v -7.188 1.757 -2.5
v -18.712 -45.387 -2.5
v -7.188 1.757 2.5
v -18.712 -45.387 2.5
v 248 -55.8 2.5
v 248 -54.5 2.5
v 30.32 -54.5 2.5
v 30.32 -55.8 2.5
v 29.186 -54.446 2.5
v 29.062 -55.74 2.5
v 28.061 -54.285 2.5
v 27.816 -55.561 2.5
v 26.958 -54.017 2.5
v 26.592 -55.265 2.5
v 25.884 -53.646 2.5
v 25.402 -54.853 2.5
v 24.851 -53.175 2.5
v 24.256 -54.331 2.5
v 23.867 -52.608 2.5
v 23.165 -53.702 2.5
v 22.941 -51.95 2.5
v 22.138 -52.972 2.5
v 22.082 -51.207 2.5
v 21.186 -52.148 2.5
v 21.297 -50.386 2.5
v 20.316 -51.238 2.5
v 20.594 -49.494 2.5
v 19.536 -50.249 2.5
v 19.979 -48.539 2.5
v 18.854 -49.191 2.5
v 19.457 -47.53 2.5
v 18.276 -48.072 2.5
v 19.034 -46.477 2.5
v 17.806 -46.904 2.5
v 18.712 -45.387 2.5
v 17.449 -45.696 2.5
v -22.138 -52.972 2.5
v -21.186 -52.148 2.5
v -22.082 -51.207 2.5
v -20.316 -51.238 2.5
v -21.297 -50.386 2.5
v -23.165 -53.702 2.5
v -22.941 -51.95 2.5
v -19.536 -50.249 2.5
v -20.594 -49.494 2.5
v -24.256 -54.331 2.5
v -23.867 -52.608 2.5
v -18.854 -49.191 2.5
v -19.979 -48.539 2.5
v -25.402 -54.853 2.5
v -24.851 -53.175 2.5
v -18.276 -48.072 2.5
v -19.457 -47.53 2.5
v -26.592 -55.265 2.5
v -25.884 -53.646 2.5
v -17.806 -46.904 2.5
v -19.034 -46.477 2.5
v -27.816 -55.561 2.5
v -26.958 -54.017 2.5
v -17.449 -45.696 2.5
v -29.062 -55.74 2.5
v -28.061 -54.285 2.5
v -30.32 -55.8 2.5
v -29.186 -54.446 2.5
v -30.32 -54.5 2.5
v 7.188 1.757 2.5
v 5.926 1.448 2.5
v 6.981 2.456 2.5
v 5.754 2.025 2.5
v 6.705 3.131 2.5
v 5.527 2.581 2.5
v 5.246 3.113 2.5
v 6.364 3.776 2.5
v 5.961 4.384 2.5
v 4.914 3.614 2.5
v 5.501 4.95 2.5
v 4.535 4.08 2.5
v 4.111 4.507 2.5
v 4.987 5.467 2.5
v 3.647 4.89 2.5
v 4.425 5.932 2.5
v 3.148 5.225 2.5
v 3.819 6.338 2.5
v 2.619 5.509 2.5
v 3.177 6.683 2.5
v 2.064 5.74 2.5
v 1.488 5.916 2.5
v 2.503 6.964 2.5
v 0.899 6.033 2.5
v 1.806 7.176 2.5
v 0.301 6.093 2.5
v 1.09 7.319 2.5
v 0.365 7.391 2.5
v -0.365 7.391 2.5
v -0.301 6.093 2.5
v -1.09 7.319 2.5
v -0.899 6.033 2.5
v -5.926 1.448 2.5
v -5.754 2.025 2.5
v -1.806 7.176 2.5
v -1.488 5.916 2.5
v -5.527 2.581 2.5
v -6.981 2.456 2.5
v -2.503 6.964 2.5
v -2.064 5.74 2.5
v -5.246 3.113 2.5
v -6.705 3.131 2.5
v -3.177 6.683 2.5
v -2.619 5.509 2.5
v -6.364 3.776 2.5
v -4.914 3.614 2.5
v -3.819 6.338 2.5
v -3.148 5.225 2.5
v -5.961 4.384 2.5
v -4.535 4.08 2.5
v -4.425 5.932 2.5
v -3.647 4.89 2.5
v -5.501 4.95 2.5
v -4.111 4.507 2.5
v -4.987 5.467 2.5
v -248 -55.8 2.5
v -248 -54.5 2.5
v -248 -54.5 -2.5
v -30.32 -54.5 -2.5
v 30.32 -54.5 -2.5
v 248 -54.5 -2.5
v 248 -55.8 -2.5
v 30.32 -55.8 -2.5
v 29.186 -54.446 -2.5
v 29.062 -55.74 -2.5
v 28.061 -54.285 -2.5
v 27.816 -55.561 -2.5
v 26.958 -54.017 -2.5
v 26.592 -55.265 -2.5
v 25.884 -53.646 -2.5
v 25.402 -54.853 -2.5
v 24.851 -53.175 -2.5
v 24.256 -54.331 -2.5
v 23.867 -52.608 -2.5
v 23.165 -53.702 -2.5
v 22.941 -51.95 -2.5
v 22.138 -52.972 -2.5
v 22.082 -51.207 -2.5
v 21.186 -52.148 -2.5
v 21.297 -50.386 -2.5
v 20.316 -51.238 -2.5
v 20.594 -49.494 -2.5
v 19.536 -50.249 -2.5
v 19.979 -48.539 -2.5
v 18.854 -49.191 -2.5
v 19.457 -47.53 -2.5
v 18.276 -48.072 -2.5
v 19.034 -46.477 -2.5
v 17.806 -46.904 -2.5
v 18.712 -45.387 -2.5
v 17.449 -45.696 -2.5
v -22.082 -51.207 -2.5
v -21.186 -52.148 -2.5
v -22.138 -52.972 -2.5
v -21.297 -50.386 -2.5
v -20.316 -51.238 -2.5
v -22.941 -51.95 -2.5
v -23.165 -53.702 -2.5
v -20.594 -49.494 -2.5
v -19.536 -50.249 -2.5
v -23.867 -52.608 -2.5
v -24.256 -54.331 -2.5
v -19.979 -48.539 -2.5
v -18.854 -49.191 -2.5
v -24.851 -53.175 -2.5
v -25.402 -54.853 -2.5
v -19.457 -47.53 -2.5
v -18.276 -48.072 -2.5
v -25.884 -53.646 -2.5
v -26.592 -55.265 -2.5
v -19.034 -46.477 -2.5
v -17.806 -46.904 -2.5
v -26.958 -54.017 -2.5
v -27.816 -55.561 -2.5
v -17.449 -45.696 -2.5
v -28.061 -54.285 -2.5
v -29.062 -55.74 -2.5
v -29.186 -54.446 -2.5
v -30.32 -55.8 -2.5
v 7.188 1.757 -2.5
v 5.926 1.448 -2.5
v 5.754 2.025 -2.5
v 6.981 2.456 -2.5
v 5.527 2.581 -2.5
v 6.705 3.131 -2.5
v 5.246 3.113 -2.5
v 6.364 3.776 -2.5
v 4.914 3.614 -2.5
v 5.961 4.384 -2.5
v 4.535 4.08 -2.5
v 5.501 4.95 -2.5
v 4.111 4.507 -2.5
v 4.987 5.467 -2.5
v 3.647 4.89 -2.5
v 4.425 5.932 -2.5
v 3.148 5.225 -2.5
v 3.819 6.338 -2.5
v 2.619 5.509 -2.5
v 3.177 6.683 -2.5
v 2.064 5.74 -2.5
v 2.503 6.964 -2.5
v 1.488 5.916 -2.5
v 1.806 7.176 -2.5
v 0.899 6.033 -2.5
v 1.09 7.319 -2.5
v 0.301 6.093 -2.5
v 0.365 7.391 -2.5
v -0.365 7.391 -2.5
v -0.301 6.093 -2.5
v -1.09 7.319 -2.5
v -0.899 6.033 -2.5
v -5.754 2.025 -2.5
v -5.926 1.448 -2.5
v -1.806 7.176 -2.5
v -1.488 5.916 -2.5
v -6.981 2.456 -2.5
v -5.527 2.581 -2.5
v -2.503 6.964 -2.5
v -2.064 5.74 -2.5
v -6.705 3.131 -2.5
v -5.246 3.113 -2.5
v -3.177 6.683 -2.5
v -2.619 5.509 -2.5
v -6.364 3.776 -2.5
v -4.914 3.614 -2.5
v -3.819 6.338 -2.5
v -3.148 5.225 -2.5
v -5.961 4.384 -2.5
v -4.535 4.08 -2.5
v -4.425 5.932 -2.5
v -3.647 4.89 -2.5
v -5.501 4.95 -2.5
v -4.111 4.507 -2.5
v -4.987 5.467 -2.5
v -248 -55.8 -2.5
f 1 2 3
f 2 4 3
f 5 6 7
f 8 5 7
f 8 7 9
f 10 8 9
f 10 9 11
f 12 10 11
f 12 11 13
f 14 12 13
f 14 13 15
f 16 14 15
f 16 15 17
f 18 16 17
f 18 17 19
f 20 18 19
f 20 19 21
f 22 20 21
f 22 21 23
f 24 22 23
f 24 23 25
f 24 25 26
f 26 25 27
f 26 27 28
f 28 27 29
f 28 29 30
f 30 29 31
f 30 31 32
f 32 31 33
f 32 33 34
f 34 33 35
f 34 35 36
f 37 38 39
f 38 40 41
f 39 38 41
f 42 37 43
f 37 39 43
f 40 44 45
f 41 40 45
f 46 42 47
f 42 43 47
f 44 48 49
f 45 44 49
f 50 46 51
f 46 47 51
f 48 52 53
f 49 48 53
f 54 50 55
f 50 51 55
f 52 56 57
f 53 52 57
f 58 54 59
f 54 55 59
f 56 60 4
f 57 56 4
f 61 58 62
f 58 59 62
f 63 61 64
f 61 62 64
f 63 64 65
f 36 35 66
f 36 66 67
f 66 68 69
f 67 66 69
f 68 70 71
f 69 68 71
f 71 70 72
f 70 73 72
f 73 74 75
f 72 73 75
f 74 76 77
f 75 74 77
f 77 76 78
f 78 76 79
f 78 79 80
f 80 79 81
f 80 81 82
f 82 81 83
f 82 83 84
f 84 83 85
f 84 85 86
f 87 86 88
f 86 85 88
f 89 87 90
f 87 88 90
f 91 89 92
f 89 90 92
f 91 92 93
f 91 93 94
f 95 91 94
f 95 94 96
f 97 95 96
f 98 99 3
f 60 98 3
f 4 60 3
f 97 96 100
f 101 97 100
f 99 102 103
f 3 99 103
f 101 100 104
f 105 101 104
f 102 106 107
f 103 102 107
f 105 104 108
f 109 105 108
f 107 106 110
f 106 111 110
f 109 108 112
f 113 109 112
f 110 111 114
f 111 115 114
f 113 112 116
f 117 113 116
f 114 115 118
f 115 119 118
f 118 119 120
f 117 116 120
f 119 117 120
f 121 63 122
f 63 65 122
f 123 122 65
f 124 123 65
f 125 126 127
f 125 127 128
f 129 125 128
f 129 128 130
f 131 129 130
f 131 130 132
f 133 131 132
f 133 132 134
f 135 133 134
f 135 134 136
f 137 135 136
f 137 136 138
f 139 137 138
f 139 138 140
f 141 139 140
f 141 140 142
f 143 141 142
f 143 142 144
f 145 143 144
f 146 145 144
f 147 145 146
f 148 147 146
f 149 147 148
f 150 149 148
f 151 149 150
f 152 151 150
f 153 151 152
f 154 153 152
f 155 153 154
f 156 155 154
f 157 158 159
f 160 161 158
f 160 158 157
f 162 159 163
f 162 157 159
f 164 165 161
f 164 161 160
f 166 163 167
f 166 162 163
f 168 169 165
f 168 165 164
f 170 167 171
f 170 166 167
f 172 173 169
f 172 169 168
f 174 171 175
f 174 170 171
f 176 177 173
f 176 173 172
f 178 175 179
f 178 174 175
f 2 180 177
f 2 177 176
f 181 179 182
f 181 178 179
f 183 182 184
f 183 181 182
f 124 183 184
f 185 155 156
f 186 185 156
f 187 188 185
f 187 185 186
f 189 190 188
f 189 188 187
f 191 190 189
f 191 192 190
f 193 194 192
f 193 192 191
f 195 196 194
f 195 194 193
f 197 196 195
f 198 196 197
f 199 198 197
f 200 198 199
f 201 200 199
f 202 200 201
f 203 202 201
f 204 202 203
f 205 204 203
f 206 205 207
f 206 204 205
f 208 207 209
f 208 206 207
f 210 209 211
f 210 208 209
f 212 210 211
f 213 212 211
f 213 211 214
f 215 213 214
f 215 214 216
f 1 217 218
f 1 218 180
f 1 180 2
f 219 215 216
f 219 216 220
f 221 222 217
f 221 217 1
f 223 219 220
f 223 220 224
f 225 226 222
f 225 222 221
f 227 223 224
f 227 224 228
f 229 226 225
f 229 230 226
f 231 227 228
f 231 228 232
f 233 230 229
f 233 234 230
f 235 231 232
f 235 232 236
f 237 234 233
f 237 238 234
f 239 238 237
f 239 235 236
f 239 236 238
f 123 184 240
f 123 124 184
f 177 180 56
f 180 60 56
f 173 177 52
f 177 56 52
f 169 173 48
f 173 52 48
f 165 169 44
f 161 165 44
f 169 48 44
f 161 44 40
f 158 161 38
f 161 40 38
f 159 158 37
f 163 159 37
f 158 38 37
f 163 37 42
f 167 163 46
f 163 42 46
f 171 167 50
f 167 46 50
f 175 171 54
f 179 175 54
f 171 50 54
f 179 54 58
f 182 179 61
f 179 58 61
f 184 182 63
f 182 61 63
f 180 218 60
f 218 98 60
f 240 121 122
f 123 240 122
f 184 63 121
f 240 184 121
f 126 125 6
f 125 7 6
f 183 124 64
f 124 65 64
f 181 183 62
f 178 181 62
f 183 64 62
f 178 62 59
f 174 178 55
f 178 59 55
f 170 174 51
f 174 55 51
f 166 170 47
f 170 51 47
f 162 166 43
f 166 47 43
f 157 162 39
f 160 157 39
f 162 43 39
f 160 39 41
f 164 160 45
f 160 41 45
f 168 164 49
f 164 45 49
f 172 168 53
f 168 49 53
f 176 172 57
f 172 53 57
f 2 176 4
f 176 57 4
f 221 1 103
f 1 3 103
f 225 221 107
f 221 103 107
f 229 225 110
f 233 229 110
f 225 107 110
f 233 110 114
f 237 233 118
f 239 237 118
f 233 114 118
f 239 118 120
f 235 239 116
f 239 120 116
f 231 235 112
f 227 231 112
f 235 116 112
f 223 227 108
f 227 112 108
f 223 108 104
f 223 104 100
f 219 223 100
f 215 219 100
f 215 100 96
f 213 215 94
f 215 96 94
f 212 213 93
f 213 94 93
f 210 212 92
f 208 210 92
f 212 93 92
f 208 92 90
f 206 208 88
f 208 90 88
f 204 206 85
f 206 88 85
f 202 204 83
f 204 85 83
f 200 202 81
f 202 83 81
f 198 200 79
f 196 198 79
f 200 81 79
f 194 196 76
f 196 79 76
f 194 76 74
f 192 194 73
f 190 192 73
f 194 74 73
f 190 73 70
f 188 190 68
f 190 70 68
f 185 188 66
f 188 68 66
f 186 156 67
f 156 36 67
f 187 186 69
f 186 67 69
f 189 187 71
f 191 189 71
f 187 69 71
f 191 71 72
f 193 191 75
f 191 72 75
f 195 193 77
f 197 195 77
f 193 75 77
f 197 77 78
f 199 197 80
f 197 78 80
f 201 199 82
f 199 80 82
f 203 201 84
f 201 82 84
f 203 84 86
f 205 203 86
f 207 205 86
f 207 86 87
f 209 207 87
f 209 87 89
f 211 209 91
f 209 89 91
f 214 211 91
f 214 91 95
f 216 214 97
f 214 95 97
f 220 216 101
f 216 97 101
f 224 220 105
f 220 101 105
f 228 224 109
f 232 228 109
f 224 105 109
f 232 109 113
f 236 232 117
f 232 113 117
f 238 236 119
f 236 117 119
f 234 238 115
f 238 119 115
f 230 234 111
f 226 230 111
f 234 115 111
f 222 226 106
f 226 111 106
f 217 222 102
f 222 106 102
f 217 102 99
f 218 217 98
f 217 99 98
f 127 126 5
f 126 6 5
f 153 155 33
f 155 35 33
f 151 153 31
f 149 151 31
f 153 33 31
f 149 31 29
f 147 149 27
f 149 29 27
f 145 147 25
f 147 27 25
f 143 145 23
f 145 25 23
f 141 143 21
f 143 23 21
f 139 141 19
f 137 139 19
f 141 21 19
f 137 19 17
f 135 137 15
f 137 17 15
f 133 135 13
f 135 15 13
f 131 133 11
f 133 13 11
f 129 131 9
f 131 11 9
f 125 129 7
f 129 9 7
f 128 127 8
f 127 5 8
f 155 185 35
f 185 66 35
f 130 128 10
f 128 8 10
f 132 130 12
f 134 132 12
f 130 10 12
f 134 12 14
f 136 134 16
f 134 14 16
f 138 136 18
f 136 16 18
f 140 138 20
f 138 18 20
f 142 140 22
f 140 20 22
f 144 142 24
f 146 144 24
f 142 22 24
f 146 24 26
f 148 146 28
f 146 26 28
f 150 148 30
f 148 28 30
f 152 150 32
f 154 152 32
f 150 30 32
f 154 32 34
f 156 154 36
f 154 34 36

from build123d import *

# Parameters (mm, degrees)
EXTRUDE_THIN1_DEPTH = 2.5


with BuildPart() as part:
    # Sketch1 → Extrude-Thin1 (new body, symmetric)
    with BuildSketch(Plane.XY):
        with BuildLine():
            Line((-248, -54.5), (-30.32, -54.5))
            ThreePointArc((-30.32, -54.5), (-22.941113788, -51.949709478), (-18.71173445, -45.387370423))
            Line((-18.71173445, -45.387370423), (-7.188382014, 1.75703273))
            ThreePointArc((-7.188382014, 1.75703273), (0, 7.4), (7.188382014, 1.75703273))
            Line((7.188382014, 1.75703273), (18.71173445, -45.387370423))
            ThreePointArc((18.71173445, -45.387370423), (22.941113788, -51.949709478), (30.32, -54.5))
            Line((30.32, -54.5), (248, -54.5))
            Line((248, -54.5), (248, -55.8))
            Line((248, -55.8), (30.32, -55.8))
            ThreePointArc((30.32, -55.8), (22.138389765, -52.972272016), (17.448910582, -45.696038335))
            Line((17.448910582, -45.696038335), (5.925558147, 1.448364818))
            ThreePointArc((5.925558147, 1.448364818), (0, 6.1), (-5.925558147, 1.448364818))
            Line((-5.925558147, 1.448364818), (-17.448910582, -45.696038335))
            ThreePointArc((-17.448910582, -45.696038335), (-22.138389765, -52.972272016), (-30.32, -55.8))
            Line((-30.32, -55.8), (-248, -55.8))
            Line((-248, -55.8), (-248, -54.5))
        make_face()
    extrude(amount=EXTRUDE_THIN1_DEPTH, both=True)


solid = part.part
